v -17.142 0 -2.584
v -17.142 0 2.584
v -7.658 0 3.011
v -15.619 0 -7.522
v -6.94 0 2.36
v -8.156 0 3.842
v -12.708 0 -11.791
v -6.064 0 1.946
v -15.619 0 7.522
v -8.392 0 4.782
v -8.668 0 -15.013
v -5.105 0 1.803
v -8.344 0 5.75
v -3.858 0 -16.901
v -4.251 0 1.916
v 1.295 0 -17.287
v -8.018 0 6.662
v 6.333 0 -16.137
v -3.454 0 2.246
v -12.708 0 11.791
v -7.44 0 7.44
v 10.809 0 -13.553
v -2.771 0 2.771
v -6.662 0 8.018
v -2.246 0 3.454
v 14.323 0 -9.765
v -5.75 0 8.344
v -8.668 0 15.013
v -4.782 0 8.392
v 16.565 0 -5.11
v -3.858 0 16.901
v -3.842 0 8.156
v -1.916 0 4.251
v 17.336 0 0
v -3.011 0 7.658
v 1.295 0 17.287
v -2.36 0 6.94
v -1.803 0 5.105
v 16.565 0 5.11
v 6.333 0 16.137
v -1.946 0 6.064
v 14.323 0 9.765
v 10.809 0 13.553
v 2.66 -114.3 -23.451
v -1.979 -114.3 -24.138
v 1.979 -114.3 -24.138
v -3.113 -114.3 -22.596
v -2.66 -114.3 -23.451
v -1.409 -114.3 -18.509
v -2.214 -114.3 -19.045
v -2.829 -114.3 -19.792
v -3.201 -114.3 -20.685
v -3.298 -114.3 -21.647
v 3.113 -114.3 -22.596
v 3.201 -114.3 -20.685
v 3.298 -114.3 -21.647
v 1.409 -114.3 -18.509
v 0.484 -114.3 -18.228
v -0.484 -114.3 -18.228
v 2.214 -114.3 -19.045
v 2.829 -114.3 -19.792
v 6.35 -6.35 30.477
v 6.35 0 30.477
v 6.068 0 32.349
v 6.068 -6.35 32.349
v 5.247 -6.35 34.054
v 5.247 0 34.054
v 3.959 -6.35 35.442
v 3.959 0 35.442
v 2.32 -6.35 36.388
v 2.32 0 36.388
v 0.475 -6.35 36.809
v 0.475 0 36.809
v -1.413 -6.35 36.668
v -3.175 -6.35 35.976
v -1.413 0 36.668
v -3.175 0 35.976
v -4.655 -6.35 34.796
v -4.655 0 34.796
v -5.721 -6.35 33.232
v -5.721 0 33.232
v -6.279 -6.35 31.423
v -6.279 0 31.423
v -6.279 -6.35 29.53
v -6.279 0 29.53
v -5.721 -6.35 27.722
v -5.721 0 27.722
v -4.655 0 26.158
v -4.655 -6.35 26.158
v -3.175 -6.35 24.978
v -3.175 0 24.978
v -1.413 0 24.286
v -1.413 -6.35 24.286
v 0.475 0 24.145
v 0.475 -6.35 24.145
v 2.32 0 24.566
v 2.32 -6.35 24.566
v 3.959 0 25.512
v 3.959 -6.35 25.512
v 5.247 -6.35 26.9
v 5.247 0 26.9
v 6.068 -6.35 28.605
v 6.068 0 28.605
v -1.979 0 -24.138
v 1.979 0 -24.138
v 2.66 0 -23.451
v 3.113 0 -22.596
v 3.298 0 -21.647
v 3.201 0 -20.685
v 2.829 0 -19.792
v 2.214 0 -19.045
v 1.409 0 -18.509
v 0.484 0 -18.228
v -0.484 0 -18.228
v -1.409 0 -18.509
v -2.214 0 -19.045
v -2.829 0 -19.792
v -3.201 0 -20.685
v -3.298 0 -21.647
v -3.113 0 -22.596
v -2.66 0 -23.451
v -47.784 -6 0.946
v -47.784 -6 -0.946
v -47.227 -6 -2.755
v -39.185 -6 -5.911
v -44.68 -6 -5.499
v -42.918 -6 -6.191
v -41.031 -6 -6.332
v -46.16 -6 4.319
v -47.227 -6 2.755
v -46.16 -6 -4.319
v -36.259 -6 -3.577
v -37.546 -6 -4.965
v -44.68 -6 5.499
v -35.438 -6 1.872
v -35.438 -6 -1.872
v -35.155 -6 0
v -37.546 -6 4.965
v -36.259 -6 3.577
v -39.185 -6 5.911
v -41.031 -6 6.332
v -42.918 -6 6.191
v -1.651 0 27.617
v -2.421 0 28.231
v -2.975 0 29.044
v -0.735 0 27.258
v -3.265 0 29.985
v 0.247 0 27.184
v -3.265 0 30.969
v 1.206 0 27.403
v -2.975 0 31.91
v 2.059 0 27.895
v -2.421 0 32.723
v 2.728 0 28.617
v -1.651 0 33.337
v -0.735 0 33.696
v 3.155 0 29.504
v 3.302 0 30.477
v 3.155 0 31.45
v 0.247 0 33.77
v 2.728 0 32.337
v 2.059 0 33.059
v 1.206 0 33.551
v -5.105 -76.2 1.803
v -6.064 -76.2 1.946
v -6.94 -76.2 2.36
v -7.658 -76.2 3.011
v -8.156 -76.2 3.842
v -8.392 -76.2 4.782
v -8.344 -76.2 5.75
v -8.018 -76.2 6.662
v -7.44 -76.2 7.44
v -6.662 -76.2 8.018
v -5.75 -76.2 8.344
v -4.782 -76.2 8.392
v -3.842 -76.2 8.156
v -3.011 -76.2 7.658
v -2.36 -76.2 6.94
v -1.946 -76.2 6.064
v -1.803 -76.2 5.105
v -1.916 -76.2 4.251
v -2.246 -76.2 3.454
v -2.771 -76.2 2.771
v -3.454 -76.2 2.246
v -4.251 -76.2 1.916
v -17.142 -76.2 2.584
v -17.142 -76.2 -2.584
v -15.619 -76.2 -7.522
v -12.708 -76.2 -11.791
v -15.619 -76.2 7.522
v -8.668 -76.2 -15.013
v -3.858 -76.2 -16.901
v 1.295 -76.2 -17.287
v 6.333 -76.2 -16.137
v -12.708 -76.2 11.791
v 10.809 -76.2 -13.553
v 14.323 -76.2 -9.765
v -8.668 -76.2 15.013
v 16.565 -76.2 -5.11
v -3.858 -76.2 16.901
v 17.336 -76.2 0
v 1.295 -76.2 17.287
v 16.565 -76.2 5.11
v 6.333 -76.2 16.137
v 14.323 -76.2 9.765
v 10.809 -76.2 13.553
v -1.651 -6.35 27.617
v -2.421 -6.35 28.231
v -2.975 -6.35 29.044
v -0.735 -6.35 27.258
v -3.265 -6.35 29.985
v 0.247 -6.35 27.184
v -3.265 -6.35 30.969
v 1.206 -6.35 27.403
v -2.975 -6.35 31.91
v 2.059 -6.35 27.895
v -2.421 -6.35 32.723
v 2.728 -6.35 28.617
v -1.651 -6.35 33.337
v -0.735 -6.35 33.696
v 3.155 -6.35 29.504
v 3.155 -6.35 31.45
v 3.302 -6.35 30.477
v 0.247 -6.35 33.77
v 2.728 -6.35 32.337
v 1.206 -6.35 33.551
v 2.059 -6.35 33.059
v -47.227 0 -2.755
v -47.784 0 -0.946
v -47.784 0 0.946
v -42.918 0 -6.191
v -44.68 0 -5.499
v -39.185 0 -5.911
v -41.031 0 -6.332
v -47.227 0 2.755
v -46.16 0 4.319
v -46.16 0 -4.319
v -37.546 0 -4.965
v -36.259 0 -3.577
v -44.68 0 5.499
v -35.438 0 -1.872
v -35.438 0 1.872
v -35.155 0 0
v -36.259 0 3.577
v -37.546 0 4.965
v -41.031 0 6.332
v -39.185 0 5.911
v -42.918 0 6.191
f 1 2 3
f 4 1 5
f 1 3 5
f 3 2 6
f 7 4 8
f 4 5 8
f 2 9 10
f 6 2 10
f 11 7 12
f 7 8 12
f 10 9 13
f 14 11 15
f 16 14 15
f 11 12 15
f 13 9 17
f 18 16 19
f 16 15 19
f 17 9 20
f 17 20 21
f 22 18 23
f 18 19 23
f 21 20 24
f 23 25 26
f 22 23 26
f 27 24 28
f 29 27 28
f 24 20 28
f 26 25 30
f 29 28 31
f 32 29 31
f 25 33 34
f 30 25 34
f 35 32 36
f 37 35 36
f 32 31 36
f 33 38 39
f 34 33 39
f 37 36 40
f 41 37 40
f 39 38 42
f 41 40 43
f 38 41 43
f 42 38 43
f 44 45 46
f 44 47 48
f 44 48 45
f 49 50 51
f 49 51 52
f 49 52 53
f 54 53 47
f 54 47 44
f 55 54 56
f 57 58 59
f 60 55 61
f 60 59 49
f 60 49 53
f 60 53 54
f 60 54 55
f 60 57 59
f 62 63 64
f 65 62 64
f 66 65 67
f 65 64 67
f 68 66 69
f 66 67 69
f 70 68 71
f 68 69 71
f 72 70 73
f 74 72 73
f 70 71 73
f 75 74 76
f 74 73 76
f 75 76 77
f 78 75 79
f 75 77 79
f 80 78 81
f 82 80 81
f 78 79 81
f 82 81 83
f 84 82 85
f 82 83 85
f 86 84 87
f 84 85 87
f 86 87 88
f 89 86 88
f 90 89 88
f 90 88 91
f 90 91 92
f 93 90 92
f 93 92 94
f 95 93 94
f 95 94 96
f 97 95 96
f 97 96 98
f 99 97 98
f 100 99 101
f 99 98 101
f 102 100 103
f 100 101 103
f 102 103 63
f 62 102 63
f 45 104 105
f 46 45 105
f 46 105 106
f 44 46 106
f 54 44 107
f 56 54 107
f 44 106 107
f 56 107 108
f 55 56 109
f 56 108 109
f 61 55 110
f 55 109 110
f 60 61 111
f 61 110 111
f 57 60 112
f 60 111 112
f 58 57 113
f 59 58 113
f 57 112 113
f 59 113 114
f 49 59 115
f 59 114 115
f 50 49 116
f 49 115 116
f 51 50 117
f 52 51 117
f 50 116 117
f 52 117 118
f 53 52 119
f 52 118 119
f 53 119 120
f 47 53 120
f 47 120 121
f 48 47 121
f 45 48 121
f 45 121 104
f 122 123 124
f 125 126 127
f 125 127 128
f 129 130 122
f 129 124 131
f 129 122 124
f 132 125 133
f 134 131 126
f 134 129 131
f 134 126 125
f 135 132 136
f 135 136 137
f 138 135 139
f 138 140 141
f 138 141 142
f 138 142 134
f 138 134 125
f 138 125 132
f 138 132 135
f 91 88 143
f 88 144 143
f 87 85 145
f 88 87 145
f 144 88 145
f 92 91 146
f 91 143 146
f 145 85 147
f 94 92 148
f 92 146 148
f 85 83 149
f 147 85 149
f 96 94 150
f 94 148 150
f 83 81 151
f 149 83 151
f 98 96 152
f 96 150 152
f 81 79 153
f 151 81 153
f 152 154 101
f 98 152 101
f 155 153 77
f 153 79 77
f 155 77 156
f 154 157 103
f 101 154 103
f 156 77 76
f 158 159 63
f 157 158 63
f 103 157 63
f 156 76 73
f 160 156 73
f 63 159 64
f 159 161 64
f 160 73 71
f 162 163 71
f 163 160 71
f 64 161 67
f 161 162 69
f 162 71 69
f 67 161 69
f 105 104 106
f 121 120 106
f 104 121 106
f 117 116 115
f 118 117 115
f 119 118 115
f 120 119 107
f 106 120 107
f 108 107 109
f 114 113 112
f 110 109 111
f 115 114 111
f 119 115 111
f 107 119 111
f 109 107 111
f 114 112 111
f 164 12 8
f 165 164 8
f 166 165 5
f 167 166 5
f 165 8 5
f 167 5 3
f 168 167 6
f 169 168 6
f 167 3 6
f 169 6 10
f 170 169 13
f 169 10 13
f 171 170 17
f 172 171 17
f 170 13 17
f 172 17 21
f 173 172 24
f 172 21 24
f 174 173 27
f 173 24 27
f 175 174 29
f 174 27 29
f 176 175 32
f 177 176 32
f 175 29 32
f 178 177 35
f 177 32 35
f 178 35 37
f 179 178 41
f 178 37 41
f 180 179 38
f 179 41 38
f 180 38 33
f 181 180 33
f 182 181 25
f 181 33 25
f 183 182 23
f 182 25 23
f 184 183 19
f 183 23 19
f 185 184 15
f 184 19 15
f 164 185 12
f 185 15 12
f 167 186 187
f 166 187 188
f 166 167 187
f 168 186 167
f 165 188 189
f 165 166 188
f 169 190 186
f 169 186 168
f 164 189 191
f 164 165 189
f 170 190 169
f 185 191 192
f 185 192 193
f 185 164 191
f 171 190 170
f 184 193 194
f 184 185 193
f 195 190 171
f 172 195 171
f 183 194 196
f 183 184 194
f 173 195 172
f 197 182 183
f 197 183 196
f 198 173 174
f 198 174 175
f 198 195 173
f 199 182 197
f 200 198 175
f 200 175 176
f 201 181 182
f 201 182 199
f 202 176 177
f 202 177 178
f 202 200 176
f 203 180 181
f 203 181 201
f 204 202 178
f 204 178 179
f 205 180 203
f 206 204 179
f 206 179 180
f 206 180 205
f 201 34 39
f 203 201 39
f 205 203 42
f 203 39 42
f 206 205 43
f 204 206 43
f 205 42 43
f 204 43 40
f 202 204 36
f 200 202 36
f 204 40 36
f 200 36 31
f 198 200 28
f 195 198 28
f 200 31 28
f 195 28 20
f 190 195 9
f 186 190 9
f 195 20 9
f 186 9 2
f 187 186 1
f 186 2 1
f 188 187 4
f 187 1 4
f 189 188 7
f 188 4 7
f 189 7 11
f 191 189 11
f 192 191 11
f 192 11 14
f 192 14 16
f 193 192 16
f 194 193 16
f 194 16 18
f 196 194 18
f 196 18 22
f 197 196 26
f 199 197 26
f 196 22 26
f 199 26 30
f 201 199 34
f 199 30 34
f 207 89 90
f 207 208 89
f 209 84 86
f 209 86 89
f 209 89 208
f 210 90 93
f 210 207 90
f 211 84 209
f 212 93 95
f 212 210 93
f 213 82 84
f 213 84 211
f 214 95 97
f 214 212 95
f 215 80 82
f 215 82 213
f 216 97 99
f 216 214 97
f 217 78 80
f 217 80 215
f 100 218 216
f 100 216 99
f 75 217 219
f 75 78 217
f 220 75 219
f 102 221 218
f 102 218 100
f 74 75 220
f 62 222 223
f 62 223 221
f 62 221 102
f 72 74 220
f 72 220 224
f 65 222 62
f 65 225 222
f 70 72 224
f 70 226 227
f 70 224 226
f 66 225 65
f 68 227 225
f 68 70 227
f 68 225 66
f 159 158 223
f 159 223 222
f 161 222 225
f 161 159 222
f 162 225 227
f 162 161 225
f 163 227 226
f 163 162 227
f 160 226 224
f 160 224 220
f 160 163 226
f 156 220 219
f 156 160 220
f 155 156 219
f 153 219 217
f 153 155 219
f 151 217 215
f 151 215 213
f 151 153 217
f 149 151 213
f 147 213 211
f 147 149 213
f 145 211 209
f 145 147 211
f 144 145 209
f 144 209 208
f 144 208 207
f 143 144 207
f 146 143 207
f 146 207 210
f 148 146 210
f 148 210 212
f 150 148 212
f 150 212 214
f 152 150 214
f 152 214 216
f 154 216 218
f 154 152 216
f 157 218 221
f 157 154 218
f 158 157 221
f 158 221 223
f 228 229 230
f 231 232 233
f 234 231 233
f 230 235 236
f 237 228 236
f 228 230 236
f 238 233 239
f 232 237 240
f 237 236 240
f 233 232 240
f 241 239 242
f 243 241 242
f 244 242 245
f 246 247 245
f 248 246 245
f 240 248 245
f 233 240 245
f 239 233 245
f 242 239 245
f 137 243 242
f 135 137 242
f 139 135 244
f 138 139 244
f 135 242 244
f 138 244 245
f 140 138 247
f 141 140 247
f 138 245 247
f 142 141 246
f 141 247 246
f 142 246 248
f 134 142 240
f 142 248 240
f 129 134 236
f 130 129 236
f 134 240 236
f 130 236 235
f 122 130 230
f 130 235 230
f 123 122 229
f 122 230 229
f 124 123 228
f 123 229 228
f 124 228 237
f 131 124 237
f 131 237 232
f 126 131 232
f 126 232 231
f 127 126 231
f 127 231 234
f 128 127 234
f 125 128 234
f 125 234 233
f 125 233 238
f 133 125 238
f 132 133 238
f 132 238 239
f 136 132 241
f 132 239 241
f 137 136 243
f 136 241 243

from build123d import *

# Parameters (mm, degrees)
F0_R     = 17.3355
F2_DEPTH = 76.2
F3_DEPTH = 114.3
F4_R     = 6.35
F4_R_2   = 3.302
F5_DEPTH = 6.35
F6_R     = 6.35
F7_DEPTH = 6


with BuildPart() as f2:
    # F0 (on Front) → F2 (new body)
    with BuildSketch(Plane.XZ):
        Circle(F0_R)
        with BuildLine():
            ThreePointArc((-5.1054, 1.8034), (-7.440267, 7.440267), (-1.8034, 5.1054))
            ThreePointArc((-1.8034, 5.1054), (-2.770533, 2.770533), (-5.1054, 1.8034))
        make_face(mode=Mode.SUBTRACT)
    extrude(amount=F2_DEPTH)


with BuildPart() as f3:
    # F1 (on Front) → F3 (new body)
    with BuildSketch(Plane.XZ):
        with BuildLine():
            Line((-1.979169, -24.13795), (1.979169, -24.13795))
            ThreePointArc((1.979169, -24.13795), (0, -18.192828), (-1.979169, -24.13795))
        make_face()
    extrude(amount=F3_DEPTH)


with BuildPart() as f5:
    # F4 (on Front) → F5 (new body)
    with BuildSketch(Plane.XZ):
        with Locations((0, 30.476896)):
            Circle(F4_R)
        with Locations((0, 30.476896)):
            Circle(F4_R_2, mode=Mode.SUBTRACT)
    extrude(amount=F5_DEPTH)


with BuildPart() as f7:
    # F6 (on Front) → F7 (new body)
    with BuildSketch(Plane.XZ):
        with Locations((-41.505409, 0)):
            Circle(F6_R)
    extrude(amount=F7_DEPTH)


solid = Compound([f2.part, f3.part, f5.part, f7.part])
